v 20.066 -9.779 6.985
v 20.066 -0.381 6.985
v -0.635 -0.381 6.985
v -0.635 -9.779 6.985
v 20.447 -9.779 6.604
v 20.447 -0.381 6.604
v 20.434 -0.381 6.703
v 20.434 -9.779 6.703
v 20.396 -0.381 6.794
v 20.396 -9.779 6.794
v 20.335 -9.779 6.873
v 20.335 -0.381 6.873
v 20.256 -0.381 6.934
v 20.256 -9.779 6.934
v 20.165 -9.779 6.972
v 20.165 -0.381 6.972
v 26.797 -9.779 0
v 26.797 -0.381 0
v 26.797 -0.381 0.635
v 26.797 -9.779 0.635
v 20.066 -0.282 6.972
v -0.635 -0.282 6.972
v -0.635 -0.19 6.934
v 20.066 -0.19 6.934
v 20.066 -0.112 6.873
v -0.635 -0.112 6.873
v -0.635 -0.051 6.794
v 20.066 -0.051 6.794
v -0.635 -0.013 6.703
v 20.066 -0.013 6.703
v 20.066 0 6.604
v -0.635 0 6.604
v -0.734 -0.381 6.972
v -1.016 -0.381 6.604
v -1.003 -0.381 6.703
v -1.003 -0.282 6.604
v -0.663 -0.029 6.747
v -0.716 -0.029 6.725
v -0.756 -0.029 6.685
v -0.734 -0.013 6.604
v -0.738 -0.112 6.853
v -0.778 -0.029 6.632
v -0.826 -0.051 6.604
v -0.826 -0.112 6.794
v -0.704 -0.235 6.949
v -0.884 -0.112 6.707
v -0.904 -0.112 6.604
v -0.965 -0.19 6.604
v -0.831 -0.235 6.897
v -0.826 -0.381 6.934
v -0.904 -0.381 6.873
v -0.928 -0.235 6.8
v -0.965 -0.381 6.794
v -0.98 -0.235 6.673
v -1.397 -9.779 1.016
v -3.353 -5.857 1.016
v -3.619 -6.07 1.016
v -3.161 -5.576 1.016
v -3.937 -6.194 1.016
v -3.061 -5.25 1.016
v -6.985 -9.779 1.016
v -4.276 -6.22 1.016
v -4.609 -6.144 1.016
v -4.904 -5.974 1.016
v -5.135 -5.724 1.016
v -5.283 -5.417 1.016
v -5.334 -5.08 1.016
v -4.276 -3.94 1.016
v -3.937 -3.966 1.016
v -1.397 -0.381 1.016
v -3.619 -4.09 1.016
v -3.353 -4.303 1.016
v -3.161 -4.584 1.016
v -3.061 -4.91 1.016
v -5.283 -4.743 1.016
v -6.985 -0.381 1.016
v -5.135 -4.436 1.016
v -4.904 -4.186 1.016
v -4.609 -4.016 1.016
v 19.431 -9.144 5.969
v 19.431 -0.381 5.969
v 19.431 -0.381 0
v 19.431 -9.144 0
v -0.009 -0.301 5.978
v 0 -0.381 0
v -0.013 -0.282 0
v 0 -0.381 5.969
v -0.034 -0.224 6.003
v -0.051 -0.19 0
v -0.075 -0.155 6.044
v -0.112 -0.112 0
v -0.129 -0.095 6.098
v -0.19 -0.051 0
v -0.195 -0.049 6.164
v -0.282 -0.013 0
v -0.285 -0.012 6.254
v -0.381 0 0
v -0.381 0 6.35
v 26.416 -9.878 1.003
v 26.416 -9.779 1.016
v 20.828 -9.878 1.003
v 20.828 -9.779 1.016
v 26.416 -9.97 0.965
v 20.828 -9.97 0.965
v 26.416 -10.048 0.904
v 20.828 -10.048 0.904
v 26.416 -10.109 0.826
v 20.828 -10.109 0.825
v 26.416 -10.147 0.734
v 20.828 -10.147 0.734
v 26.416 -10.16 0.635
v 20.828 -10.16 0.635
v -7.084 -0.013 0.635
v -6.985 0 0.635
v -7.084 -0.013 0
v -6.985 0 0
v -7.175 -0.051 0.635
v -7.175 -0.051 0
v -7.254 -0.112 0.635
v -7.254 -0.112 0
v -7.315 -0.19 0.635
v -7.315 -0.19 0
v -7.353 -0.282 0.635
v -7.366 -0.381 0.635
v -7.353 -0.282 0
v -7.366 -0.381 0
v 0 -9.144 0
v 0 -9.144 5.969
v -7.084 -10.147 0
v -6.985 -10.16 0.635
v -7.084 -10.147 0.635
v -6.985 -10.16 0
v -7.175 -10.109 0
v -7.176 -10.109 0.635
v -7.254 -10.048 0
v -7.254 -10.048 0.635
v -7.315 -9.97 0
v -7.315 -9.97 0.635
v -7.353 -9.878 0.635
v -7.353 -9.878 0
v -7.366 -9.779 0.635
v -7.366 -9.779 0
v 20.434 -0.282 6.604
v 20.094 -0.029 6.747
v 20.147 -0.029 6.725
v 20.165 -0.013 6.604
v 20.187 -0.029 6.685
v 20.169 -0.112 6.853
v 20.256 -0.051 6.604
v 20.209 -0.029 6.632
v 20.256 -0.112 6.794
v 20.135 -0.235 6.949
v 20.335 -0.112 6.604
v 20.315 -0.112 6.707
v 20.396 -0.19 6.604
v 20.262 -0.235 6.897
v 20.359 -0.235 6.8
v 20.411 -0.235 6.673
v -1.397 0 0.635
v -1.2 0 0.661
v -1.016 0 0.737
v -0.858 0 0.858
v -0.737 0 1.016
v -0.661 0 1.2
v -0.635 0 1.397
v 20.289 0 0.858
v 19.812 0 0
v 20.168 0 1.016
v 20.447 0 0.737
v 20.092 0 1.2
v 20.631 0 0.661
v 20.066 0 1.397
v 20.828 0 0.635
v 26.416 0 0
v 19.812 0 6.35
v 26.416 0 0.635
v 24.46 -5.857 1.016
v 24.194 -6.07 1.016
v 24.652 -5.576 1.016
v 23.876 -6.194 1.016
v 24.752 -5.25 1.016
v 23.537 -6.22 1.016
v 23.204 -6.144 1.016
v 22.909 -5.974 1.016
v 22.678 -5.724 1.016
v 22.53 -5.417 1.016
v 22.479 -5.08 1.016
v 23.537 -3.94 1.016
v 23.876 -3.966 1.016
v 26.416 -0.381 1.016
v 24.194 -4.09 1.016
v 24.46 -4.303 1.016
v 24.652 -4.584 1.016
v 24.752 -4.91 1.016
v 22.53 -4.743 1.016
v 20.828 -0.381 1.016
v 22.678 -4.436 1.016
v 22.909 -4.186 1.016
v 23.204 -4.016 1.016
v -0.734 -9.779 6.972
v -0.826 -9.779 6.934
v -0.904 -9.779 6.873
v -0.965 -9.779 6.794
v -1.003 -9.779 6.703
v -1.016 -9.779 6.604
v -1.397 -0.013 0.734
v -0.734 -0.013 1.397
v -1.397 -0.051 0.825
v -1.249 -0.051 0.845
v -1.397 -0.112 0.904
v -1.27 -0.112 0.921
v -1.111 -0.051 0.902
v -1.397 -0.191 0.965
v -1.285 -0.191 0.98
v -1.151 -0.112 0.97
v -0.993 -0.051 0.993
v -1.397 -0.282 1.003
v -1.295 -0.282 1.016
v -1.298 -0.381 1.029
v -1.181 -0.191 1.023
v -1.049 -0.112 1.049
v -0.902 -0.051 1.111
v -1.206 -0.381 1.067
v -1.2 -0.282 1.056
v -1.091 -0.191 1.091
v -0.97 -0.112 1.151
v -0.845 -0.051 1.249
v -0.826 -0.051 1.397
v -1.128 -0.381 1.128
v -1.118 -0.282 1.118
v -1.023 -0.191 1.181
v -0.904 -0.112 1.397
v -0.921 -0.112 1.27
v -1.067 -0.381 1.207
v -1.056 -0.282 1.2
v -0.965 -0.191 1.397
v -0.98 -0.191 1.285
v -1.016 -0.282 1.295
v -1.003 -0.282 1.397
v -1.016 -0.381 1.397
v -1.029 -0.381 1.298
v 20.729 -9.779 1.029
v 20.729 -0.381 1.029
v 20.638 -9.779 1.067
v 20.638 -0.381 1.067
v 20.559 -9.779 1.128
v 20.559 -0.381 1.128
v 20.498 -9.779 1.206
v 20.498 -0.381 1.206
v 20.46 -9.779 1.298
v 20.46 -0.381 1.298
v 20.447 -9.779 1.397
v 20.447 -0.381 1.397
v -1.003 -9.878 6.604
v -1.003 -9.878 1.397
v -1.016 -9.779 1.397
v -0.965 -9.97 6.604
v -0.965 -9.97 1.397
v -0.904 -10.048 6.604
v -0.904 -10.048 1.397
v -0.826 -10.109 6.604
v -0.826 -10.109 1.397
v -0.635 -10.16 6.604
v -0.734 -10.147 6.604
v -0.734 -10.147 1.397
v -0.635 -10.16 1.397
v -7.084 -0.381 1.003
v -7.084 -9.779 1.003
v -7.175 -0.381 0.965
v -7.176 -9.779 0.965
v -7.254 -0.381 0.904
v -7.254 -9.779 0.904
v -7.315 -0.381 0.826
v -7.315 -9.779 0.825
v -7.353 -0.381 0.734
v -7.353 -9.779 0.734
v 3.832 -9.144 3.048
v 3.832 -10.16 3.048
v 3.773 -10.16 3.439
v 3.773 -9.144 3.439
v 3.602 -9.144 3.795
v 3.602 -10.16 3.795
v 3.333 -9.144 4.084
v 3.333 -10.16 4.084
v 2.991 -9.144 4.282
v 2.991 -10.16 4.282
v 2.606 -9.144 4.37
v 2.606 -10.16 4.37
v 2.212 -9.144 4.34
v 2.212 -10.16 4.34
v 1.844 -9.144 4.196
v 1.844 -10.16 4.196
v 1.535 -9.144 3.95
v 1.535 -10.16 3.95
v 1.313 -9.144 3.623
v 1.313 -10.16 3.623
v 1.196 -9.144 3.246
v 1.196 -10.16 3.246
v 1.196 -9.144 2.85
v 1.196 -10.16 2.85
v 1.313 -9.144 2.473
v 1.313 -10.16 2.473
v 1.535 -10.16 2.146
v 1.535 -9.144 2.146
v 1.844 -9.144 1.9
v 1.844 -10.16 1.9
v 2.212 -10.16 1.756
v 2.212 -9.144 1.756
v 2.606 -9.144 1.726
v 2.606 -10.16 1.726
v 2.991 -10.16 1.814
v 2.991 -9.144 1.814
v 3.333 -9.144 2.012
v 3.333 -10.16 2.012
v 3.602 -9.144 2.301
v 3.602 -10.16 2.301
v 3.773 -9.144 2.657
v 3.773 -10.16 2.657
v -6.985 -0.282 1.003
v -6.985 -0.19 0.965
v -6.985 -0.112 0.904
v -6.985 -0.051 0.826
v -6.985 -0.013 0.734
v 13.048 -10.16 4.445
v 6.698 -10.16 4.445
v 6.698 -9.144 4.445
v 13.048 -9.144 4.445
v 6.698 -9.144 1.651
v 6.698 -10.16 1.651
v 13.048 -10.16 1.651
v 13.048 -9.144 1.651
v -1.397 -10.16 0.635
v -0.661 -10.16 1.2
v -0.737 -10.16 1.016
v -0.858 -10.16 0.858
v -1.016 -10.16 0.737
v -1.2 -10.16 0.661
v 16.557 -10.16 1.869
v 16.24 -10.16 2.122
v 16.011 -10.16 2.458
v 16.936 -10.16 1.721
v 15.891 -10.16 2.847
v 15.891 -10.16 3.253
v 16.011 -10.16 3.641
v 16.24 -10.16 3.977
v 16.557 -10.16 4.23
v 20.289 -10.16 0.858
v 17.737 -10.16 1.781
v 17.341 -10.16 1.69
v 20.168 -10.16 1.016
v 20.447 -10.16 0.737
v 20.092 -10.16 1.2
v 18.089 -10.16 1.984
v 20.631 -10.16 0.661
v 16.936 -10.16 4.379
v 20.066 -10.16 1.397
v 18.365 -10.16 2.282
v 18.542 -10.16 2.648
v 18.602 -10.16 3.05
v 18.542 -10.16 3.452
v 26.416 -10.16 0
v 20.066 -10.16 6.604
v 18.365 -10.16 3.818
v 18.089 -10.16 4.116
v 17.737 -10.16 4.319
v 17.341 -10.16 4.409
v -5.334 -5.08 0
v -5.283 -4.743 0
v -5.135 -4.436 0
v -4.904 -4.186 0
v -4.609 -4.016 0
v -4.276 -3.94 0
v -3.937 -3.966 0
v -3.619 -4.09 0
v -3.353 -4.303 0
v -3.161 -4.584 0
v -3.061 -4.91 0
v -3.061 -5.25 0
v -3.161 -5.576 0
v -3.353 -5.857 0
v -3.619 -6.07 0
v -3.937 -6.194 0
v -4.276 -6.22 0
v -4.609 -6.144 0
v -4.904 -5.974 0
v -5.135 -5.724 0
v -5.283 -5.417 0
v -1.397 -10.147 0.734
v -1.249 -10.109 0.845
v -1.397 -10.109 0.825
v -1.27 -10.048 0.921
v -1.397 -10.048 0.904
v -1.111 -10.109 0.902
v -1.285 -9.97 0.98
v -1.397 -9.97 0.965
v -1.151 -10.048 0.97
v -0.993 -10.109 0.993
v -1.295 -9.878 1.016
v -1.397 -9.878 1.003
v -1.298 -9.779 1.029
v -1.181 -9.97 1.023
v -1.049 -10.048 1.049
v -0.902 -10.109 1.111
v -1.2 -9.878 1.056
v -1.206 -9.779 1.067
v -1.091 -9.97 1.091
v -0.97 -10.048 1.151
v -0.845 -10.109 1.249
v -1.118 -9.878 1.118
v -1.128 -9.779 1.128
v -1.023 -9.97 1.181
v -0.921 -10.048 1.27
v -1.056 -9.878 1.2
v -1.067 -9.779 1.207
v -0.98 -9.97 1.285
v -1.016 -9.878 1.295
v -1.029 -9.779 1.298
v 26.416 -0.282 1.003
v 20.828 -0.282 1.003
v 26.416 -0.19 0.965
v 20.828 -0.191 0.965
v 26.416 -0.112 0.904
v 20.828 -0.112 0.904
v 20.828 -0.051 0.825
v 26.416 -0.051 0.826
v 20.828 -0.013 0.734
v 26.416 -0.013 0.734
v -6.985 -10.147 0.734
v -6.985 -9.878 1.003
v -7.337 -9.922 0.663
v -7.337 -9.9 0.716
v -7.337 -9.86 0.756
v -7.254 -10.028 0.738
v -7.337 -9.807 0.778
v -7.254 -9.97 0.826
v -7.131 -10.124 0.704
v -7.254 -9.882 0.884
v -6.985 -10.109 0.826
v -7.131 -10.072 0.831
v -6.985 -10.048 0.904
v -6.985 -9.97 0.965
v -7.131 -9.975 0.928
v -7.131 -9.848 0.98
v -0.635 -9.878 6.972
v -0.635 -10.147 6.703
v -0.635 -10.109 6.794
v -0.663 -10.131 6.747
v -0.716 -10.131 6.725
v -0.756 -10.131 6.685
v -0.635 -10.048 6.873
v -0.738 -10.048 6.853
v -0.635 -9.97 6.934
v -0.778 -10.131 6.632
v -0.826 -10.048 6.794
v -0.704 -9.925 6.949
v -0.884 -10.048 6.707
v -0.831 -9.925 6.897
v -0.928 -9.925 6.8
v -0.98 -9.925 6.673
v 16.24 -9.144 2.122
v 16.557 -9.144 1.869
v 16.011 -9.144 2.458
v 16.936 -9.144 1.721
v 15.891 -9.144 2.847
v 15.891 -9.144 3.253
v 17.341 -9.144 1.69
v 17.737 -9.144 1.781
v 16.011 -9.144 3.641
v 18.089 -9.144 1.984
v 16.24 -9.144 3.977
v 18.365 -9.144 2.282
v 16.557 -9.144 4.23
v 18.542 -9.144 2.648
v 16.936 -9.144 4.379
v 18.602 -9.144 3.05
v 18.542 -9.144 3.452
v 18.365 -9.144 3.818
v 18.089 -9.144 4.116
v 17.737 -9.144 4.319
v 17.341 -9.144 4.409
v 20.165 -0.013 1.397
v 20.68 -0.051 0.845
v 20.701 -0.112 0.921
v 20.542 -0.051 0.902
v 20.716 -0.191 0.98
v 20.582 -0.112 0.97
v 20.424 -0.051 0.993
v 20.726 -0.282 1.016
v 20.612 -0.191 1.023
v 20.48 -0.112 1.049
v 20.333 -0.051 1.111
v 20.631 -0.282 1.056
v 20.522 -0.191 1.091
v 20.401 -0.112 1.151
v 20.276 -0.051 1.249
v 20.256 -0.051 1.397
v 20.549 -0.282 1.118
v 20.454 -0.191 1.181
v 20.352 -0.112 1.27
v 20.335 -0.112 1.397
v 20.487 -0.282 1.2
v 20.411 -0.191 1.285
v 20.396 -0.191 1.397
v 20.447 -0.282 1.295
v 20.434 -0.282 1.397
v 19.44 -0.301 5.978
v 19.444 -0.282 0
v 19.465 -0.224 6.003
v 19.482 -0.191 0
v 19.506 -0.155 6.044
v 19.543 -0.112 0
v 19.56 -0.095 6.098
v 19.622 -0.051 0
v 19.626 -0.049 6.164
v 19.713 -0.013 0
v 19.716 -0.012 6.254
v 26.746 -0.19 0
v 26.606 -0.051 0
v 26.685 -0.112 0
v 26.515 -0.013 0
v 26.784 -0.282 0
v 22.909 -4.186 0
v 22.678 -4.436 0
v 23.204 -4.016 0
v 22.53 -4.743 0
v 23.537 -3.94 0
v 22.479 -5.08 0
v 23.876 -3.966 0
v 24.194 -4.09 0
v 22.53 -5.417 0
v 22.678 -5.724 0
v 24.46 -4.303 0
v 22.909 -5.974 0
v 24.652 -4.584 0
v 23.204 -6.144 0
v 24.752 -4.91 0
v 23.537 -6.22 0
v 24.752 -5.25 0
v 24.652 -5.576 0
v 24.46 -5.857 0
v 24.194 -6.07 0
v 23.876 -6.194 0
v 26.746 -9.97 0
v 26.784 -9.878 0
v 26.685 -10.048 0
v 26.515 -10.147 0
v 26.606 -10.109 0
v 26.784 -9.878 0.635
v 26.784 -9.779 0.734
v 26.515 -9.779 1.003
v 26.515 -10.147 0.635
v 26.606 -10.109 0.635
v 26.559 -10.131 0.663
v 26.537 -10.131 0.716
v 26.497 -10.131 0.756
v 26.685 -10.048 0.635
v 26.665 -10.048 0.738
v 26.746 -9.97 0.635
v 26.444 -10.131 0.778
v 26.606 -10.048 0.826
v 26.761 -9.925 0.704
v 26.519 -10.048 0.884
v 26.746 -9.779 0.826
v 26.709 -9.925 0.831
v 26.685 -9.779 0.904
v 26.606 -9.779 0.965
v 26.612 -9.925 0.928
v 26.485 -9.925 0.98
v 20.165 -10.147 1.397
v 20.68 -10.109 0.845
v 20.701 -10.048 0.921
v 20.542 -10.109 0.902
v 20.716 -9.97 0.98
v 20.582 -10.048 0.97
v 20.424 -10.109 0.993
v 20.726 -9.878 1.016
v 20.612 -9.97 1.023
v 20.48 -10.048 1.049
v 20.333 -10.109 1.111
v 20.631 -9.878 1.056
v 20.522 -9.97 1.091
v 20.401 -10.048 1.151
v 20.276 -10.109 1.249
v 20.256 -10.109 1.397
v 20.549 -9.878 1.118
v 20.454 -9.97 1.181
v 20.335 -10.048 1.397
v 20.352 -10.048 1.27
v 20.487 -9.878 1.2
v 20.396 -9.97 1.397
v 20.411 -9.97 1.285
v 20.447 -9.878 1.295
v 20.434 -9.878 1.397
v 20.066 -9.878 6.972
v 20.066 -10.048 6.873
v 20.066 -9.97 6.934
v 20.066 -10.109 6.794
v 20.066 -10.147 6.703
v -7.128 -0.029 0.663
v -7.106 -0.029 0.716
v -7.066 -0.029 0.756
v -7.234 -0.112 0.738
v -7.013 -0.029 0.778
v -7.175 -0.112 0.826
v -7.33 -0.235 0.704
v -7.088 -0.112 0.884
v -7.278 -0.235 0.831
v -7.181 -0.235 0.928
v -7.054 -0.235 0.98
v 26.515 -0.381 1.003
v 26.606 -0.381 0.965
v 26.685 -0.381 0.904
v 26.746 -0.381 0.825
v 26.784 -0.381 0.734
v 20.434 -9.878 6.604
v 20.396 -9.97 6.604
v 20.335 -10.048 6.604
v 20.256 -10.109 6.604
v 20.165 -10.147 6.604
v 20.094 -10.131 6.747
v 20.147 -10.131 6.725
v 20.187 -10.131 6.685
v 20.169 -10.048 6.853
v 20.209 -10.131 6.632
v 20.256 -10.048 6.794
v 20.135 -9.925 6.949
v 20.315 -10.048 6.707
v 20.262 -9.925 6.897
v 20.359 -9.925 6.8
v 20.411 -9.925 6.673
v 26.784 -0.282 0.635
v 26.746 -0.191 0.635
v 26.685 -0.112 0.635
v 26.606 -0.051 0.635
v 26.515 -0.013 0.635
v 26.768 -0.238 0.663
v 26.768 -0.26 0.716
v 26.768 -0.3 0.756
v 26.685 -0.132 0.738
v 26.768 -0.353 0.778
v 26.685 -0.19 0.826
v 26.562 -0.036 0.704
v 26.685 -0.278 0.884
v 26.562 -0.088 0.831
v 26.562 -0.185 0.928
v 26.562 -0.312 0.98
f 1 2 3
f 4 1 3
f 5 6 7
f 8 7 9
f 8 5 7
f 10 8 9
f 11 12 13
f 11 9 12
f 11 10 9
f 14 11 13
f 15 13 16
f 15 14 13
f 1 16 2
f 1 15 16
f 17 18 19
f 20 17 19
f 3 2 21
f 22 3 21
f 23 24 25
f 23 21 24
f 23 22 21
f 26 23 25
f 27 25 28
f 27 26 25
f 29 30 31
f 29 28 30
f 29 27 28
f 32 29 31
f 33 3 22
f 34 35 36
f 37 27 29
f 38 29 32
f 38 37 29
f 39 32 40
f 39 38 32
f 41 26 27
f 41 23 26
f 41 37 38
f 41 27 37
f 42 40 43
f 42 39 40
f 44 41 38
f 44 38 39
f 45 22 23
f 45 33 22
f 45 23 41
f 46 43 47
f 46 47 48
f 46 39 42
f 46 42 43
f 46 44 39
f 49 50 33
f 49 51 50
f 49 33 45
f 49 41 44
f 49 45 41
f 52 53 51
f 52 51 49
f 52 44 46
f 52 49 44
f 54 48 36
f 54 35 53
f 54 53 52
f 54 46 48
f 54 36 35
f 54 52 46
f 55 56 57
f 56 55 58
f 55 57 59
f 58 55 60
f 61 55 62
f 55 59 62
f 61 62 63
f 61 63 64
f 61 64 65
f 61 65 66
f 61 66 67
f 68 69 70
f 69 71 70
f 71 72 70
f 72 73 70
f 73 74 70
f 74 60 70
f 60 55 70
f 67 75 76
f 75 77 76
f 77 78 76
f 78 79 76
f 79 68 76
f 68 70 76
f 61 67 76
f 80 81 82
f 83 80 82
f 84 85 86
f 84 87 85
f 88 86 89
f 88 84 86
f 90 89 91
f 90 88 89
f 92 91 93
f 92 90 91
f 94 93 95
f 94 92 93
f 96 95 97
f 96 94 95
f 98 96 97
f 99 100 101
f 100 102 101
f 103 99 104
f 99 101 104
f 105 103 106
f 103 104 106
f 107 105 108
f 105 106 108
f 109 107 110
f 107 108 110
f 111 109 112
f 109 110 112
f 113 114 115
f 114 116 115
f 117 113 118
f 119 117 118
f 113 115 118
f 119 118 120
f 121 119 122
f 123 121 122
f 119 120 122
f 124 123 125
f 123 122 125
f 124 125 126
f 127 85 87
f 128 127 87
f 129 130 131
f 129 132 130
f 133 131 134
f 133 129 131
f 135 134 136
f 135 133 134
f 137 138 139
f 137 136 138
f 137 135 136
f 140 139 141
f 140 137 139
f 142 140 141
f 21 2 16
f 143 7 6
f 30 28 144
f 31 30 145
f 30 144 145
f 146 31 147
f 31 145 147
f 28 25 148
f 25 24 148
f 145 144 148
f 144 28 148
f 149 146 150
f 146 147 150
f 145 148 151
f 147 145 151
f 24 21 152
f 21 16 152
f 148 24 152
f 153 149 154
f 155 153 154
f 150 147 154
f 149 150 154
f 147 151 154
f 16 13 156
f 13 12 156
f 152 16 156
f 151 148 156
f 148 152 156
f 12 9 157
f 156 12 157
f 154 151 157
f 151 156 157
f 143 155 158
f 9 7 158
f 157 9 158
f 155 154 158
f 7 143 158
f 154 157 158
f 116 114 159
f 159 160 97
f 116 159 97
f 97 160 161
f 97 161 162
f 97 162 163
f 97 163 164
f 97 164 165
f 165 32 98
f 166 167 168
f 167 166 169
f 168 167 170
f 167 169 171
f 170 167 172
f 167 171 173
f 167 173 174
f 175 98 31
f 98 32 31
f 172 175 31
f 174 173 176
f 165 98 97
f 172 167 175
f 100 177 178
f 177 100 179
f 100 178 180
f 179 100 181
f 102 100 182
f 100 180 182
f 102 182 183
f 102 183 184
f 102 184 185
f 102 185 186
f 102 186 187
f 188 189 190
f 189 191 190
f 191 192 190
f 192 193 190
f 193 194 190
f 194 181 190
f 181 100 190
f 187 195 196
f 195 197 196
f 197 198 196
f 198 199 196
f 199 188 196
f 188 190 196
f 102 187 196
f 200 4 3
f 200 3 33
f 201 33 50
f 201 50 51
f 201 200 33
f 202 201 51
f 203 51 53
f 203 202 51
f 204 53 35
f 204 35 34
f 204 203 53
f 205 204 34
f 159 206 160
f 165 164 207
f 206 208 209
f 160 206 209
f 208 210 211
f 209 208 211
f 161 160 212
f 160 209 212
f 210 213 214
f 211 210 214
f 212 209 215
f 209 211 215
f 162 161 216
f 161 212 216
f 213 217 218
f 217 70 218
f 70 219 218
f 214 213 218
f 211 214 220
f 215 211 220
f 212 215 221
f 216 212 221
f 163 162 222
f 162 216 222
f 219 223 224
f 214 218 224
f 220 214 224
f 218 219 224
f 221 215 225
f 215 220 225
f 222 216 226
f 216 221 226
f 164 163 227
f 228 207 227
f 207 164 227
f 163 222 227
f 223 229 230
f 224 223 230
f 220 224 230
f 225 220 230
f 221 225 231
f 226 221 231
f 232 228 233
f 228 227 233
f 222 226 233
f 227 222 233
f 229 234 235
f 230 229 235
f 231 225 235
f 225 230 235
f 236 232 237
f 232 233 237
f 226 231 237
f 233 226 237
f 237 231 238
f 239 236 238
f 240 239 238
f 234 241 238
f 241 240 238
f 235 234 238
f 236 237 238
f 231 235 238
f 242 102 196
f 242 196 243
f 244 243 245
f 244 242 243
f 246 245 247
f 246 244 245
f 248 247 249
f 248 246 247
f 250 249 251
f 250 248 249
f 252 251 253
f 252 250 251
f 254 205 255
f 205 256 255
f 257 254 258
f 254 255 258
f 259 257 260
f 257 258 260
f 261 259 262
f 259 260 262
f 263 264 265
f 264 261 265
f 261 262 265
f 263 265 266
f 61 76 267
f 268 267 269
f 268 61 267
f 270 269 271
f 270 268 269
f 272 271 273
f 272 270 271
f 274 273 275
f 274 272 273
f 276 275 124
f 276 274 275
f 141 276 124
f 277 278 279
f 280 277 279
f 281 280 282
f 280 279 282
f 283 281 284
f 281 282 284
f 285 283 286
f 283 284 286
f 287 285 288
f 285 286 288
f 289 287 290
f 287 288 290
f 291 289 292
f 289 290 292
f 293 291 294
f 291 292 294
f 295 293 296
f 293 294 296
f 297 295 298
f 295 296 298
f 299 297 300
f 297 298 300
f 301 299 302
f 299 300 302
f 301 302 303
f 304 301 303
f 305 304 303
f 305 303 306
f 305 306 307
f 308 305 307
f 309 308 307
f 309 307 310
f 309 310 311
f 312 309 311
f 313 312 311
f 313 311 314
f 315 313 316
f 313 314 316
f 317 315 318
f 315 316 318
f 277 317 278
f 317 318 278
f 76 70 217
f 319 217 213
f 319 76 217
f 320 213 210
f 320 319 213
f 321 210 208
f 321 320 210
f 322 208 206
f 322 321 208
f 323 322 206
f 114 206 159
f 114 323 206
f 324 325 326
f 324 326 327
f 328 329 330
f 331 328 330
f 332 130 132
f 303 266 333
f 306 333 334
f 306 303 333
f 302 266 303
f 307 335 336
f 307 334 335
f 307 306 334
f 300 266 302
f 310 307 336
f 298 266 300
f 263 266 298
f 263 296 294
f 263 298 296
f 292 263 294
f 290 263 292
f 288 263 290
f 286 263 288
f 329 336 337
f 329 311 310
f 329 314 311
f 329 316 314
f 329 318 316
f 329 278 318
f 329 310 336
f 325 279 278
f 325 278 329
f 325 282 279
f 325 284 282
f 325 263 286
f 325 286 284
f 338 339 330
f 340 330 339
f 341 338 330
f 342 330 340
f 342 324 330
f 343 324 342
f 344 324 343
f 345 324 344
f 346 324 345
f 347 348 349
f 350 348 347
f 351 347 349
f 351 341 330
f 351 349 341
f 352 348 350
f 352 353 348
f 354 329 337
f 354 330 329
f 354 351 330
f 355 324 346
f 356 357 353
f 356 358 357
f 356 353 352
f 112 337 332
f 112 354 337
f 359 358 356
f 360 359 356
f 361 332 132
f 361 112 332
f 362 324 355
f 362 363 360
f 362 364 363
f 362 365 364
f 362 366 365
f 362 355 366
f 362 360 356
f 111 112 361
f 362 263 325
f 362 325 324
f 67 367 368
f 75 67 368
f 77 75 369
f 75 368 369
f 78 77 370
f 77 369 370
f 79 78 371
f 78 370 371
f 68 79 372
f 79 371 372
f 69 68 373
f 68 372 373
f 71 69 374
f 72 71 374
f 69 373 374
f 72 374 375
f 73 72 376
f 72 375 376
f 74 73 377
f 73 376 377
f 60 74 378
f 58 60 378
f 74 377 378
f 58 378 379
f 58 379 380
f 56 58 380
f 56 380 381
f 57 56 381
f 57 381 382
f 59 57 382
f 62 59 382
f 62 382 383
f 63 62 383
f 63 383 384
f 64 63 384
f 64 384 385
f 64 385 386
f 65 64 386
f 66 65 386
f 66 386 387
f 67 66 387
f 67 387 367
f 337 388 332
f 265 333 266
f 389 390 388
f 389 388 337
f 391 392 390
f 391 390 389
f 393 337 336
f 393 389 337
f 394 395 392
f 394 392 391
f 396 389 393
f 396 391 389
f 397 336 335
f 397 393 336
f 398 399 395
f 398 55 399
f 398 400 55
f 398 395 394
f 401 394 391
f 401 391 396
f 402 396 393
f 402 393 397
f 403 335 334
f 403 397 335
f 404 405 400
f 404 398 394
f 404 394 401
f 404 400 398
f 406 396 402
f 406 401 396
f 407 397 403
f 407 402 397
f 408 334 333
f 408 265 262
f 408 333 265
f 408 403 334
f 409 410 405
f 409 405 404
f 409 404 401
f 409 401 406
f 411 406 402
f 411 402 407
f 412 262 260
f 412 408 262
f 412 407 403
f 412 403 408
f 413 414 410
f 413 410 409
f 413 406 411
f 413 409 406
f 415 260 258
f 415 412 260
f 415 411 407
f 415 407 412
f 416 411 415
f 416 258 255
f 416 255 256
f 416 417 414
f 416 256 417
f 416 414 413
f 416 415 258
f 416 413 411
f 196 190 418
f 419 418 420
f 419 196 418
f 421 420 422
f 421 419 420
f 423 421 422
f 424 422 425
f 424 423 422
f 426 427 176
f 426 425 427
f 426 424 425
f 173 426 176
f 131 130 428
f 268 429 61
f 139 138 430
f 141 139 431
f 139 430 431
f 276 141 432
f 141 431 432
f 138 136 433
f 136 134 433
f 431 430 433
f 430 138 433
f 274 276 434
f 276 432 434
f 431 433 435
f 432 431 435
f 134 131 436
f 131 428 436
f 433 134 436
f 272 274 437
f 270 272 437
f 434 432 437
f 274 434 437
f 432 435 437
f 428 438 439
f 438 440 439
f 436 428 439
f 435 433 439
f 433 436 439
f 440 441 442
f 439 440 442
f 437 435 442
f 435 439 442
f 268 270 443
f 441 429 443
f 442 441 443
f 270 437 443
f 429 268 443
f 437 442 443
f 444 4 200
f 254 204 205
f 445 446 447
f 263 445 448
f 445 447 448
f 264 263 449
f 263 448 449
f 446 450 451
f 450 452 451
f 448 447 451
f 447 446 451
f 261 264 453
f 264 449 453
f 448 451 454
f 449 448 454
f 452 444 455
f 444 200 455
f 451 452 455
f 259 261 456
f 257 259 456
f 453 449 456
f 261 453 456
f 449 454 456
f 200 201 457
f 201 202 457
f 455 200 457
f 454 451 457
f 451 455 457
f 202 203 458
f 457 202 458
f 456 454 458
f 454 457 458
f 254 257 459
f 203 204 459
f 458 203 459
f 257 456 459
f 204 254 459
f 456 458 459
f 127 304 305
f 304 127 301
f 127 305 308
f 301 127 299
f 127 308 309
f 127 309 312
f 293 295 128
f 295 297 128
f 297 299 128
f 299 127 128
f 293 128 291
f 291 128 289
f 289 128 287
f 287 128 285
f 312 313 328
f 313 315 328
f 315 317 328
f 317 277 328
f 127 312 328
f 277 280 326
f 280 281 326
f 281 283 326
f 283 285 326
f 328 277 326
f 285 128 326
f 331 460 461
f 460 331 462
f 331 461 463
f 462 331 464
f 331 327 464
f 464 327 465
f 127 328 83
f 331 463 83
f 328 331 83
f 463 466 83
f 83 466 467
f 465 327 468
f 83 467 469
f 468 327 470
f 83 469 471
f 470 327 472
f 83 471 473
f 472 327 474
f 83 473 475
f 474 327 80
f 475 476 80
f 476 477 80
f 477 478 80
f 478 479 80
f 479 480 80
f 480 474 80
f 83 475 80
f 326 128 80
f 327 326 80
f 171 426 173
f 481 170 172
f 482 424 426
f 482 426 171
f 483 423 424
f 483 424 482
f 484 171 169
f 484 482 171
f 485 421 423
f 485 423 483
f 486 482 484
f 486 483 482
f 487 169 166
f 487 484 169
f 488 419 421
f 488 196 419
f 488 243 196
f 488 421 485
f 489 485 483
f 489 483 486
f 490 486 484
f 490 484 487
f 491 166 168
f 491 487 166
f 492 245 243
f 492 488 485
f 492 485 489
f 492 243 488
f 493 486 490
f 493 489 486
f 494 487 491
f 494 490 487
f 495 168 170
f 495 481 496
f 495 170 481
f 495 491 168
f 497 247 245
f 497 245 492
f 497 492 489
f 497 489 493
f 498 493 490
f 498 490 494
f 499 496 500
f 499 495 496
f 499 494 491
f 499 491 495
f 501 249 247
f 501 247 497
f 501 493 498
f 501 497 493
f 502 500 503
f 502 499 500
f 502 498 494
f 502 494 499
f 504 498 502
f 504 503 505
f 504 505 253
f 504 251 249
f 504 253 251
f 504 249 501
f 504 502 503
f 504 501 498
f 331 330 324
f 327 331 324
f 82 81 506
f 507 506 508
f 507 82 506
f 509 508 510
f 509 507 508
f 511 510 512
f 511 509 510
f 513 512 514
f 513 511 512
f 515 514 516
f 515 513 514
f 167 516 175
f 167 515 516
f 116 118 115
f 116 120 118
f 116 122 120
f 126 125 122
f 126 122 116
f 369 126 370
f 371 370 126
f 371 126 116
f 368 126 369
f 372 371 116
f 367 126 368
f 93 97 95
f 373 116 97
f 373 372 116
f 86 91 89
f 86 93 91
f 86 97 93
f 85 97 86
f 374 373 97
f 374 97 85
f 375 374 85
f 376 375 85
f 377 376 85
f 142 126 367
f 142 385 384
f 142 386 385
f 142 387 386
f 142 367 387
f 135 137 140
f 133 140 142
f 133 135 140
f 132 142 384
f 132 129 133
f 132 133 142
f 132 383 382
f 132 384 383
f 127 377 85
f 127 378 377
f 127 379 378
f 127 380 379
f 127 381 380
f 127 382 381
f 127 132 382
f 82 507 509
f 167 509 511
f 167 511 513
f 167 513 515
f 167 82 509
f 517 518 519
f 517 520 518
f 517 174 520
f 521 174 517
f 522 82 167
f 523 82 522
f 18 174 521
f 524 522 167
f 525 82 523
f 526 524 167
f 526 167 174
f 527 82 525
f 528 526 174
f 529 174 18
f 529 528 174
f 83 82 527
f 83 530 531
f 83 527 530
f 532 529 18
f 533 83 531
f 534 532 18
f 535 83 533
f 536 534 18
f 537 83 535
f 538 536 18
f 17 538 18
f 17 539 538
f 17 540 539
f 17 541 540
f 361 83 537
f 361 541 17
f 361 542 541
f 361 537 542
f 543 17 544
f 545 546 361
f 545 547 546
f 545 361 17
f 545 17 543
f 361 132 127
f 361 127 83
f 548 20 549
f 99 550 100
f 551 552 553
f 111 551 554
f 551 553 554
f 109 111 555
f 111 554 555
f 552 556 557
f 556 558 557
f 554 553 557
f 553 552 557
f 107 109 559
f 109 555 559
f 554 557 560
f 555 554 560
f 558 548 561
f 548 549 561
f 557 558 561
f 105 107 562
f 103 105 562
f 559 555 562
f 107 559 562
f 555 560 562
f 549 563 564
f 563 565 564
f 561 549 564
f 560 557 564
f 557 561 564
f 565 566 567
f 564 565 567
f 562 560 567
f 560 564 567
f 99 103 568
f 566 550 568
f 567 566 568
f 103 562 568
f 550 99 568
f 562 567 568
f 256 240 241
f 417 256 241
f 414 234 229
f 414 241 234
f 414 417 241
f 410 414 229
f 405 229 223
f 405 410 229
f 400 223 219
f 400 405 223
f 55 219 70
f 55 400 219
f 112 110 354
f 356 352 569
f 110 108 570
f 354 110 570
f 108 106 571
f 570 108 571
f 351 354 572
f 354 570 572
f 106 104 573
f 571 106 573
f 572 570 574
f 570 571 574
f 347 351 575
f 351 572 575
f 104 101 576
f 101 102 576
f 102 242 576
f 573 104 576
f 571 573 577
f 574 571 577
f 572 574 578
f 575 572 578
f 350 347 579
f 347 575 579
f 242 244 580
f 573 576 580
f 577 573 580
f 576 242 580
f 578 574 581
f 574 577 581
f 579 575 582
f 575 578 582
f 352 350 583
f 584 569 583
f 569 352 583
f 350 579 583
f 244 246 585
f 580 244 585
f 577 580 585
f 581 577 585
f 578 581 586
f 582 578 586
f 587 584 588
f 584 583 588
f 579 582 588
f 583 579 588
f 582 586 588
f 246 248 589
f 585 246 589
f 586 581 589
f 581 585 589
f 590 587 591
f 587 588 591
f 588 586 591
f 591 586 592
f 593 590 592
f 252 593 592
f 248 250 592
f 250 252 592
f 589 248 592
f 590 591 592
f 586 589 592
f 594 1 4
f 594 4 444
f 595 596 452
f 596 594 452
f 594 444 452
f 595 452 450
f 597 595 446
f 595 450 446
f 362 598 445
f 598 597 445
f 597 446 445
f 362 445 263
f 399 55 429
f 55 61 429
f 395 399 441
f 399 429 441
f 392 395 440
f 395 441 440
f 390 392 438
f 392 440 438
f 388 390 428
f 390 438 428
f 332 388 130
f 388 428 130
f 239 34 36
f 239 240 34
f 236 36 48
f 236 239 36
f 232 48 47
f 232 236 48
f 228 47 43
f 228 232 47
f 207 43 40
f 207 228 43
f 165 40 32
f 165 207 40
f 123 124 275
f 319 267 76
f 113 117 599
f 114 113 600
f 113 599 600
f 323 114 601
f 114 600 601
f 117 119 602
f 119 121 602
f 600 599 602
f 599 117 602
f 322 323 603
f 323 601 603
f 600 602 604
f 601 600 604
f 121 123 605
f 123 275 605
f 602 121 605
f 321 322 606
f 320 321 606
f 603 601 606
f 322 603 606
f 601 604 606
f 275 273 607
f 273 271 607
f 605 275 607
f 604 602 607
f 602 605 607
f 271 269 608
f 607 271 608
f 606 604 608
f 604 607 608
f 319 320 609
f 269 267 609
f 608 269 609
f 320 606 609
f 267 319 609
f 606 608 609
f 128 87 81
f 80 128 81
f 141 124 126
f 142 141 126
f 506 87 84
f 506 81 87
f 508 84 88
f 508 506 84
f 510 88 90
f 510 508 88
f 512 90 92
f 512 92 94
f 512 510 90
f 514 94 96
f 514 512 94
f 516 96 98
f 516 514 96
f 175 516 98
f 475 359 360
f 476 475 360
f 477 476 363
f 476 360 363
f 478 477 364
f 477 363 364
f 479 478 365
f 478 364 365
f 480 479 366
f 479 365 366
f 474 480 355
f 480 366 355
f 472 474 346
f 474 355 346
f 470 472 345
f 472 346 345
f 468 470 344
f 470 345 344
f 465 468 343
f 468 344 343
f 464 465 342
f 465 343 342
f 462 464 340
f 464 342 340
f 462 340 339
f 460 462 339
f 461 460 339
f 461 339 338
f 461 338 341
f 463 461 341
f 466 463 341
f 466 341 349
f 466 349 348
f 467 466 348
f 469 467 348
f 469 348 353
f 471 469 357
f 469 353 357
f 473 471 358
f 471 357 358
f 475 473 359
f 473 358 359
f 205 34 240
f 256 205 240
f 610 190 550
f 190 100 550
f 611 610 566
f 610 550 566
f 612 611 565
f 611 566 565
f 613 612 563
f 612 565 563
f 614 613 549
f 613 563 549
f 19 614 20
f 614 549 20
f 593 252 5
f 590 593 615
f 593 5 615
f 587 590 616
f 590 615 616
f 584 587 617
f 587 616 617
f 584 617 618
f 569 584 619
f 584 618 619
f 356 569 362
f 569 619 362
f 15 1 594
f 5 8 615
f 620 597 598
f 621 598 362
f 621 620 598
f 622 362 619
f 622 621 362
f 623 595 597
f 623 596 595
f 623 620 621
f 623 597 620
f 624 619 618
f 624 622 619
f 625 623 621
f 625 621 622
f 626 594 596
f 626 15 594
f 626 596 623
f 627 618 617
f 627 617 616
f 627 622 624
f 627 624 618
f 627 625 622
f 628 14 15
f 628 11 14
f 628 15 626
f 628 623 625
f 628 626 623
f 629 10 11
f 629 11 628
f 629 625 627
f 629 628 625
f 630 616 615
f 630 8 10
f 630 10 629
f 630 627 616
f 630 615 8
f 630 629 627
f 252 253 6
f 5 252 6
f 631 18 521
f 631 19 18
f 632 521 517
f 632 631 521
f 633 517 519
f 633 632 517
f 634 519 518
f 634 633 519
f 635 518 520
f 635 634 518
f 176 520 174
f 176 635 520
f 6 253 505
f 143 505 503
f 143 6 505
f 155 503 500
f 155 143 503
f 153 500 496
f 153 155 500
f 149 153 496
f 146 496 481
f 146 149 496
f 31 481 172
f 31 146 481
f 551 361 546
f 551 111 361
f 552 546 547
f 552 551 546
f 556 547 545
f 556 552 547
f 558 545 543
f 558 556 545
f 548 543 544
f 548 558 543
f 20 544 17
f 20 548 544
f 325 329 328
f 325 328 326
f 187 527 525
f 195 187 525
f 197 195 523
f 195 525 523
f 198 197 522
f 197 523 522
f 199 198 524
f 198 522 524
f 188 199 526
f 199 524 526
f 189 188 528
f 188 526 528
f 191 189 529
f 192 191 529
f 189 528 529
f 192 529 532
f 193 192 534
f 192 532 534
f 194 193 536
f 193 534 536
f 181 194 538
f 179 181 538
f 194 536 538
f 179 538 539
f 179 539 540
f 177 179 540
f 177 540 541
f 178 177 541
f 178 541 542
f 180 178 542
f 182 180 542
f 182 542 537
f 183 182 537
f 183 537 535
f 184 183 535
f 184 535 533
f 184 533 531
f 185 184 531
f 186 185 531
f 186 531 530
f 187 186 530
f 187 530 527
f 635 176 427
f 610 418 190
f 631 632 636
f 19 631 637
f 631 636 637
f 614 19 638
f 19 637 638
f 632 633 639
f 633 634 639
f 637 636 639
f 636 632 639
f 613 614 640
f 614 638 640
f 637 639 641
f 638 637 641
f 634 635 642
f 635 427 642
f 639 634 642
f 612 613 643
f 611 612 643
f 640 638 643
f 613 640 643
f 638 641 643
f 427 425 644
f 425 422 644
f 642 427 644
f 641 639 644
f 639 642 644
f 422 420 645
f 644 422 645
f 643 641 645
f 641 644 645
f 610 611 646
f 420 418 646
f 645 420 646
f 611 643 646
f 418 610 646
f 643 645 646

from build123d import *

# Parameters (mm, degrees)
F1_DEPTH = 10.16
F3_D     = 2.286
F4_W     = 19.431
F4_H     = 5.969
F4_R     = 1.3254329065
F4_W_2   = 6.35
F4_H_2   = 2.794
F4_R_2   = 1.3633247541
F5_DEPTH = 1.016
F6_R     = 0.381


with BuildPart() as f1:
    # F0 (on Front) → F1 (new body)
    with BuildSketch(Plane.XZ):
        Polygon((-7.366, 1.016), (-7.366, 0), (0, 0), (0, 5.969), (19.431, 5.969), (19.431, 0), (26.797, 0), (26.797, 1.016), (20.447, 1.016), (20.447, 6.985), (-1.016, 6.985), (-1.016, 1.016), align=None)
    extrude(amount=F1_DEPTH)

    # F3 (through all)
    with Locations(Plane.XY.offset(1.016)):
        with Locations((-4.191, -5.08), (23.622, -5.08)):
            Hole(F3_D / 2)

    # F4 (on face) → F5 (join)
    with BuildSketch(Plane.XZ.offset(10.16)):
        with Locations((9.7155, 2.9845)):
            Rectangle(F4_W, F4_H)
        with Locations((2.5069266703, 3.048)):
            Circle(F4_R, mode=Mode.SUBTRACT)
        with Locations((9.8729266703, 3.048)):
            Rectangle(F4_W_2, F4_H_2, mode=Mode.SUBTRACT)
        with Locations((17.2389266703, 3.0497561675)):
            Circle(F4_R_2, mode=Mode.SUBTRACT)
    extrude(amount=-F5_DEPTH)

    # F6
    f6_edges = [f1.edges().sort_by_distance(p)[0] for p in [
        (20.447, -5.08, 6.985),
        (-1.016, -5.08, 6.985),
        (9.7155, 0, 6.985),
        (9.7155, -10.16, 6.985),
        (-1.016, -10.16, 4.0005),
        (-1.016, -5.08, 1.016),
        (-4.191, -10.16, 1.016),
        (-7.366, -10.16, 0.508),
        (-7.366, -5.08, 1.016),
        (-7.366, 0, 0.508),
        (-4.191, 0, 1.016),
        (0, 0, 2.9845),
        (9.7155, 0, 5.969),
        (19.431, 0, 2.9845),
        (20.447, 0, 4.0005),
        (20.447, -5.08, 1.016),
        (23.622, 0, 1.016),
        (26.797, 0, 0.508),
        (26.797, -5.08, 1.016),
        (26.797, -10.16, 0.508),
        (23.622, -10.16, 1.016),
        (20.447, -10.16, 4.0005),
        (-1.016, 0, 4.0005),
    ]]
    fillet(f6_edges, radius=F6_R)


solid = f1.part
